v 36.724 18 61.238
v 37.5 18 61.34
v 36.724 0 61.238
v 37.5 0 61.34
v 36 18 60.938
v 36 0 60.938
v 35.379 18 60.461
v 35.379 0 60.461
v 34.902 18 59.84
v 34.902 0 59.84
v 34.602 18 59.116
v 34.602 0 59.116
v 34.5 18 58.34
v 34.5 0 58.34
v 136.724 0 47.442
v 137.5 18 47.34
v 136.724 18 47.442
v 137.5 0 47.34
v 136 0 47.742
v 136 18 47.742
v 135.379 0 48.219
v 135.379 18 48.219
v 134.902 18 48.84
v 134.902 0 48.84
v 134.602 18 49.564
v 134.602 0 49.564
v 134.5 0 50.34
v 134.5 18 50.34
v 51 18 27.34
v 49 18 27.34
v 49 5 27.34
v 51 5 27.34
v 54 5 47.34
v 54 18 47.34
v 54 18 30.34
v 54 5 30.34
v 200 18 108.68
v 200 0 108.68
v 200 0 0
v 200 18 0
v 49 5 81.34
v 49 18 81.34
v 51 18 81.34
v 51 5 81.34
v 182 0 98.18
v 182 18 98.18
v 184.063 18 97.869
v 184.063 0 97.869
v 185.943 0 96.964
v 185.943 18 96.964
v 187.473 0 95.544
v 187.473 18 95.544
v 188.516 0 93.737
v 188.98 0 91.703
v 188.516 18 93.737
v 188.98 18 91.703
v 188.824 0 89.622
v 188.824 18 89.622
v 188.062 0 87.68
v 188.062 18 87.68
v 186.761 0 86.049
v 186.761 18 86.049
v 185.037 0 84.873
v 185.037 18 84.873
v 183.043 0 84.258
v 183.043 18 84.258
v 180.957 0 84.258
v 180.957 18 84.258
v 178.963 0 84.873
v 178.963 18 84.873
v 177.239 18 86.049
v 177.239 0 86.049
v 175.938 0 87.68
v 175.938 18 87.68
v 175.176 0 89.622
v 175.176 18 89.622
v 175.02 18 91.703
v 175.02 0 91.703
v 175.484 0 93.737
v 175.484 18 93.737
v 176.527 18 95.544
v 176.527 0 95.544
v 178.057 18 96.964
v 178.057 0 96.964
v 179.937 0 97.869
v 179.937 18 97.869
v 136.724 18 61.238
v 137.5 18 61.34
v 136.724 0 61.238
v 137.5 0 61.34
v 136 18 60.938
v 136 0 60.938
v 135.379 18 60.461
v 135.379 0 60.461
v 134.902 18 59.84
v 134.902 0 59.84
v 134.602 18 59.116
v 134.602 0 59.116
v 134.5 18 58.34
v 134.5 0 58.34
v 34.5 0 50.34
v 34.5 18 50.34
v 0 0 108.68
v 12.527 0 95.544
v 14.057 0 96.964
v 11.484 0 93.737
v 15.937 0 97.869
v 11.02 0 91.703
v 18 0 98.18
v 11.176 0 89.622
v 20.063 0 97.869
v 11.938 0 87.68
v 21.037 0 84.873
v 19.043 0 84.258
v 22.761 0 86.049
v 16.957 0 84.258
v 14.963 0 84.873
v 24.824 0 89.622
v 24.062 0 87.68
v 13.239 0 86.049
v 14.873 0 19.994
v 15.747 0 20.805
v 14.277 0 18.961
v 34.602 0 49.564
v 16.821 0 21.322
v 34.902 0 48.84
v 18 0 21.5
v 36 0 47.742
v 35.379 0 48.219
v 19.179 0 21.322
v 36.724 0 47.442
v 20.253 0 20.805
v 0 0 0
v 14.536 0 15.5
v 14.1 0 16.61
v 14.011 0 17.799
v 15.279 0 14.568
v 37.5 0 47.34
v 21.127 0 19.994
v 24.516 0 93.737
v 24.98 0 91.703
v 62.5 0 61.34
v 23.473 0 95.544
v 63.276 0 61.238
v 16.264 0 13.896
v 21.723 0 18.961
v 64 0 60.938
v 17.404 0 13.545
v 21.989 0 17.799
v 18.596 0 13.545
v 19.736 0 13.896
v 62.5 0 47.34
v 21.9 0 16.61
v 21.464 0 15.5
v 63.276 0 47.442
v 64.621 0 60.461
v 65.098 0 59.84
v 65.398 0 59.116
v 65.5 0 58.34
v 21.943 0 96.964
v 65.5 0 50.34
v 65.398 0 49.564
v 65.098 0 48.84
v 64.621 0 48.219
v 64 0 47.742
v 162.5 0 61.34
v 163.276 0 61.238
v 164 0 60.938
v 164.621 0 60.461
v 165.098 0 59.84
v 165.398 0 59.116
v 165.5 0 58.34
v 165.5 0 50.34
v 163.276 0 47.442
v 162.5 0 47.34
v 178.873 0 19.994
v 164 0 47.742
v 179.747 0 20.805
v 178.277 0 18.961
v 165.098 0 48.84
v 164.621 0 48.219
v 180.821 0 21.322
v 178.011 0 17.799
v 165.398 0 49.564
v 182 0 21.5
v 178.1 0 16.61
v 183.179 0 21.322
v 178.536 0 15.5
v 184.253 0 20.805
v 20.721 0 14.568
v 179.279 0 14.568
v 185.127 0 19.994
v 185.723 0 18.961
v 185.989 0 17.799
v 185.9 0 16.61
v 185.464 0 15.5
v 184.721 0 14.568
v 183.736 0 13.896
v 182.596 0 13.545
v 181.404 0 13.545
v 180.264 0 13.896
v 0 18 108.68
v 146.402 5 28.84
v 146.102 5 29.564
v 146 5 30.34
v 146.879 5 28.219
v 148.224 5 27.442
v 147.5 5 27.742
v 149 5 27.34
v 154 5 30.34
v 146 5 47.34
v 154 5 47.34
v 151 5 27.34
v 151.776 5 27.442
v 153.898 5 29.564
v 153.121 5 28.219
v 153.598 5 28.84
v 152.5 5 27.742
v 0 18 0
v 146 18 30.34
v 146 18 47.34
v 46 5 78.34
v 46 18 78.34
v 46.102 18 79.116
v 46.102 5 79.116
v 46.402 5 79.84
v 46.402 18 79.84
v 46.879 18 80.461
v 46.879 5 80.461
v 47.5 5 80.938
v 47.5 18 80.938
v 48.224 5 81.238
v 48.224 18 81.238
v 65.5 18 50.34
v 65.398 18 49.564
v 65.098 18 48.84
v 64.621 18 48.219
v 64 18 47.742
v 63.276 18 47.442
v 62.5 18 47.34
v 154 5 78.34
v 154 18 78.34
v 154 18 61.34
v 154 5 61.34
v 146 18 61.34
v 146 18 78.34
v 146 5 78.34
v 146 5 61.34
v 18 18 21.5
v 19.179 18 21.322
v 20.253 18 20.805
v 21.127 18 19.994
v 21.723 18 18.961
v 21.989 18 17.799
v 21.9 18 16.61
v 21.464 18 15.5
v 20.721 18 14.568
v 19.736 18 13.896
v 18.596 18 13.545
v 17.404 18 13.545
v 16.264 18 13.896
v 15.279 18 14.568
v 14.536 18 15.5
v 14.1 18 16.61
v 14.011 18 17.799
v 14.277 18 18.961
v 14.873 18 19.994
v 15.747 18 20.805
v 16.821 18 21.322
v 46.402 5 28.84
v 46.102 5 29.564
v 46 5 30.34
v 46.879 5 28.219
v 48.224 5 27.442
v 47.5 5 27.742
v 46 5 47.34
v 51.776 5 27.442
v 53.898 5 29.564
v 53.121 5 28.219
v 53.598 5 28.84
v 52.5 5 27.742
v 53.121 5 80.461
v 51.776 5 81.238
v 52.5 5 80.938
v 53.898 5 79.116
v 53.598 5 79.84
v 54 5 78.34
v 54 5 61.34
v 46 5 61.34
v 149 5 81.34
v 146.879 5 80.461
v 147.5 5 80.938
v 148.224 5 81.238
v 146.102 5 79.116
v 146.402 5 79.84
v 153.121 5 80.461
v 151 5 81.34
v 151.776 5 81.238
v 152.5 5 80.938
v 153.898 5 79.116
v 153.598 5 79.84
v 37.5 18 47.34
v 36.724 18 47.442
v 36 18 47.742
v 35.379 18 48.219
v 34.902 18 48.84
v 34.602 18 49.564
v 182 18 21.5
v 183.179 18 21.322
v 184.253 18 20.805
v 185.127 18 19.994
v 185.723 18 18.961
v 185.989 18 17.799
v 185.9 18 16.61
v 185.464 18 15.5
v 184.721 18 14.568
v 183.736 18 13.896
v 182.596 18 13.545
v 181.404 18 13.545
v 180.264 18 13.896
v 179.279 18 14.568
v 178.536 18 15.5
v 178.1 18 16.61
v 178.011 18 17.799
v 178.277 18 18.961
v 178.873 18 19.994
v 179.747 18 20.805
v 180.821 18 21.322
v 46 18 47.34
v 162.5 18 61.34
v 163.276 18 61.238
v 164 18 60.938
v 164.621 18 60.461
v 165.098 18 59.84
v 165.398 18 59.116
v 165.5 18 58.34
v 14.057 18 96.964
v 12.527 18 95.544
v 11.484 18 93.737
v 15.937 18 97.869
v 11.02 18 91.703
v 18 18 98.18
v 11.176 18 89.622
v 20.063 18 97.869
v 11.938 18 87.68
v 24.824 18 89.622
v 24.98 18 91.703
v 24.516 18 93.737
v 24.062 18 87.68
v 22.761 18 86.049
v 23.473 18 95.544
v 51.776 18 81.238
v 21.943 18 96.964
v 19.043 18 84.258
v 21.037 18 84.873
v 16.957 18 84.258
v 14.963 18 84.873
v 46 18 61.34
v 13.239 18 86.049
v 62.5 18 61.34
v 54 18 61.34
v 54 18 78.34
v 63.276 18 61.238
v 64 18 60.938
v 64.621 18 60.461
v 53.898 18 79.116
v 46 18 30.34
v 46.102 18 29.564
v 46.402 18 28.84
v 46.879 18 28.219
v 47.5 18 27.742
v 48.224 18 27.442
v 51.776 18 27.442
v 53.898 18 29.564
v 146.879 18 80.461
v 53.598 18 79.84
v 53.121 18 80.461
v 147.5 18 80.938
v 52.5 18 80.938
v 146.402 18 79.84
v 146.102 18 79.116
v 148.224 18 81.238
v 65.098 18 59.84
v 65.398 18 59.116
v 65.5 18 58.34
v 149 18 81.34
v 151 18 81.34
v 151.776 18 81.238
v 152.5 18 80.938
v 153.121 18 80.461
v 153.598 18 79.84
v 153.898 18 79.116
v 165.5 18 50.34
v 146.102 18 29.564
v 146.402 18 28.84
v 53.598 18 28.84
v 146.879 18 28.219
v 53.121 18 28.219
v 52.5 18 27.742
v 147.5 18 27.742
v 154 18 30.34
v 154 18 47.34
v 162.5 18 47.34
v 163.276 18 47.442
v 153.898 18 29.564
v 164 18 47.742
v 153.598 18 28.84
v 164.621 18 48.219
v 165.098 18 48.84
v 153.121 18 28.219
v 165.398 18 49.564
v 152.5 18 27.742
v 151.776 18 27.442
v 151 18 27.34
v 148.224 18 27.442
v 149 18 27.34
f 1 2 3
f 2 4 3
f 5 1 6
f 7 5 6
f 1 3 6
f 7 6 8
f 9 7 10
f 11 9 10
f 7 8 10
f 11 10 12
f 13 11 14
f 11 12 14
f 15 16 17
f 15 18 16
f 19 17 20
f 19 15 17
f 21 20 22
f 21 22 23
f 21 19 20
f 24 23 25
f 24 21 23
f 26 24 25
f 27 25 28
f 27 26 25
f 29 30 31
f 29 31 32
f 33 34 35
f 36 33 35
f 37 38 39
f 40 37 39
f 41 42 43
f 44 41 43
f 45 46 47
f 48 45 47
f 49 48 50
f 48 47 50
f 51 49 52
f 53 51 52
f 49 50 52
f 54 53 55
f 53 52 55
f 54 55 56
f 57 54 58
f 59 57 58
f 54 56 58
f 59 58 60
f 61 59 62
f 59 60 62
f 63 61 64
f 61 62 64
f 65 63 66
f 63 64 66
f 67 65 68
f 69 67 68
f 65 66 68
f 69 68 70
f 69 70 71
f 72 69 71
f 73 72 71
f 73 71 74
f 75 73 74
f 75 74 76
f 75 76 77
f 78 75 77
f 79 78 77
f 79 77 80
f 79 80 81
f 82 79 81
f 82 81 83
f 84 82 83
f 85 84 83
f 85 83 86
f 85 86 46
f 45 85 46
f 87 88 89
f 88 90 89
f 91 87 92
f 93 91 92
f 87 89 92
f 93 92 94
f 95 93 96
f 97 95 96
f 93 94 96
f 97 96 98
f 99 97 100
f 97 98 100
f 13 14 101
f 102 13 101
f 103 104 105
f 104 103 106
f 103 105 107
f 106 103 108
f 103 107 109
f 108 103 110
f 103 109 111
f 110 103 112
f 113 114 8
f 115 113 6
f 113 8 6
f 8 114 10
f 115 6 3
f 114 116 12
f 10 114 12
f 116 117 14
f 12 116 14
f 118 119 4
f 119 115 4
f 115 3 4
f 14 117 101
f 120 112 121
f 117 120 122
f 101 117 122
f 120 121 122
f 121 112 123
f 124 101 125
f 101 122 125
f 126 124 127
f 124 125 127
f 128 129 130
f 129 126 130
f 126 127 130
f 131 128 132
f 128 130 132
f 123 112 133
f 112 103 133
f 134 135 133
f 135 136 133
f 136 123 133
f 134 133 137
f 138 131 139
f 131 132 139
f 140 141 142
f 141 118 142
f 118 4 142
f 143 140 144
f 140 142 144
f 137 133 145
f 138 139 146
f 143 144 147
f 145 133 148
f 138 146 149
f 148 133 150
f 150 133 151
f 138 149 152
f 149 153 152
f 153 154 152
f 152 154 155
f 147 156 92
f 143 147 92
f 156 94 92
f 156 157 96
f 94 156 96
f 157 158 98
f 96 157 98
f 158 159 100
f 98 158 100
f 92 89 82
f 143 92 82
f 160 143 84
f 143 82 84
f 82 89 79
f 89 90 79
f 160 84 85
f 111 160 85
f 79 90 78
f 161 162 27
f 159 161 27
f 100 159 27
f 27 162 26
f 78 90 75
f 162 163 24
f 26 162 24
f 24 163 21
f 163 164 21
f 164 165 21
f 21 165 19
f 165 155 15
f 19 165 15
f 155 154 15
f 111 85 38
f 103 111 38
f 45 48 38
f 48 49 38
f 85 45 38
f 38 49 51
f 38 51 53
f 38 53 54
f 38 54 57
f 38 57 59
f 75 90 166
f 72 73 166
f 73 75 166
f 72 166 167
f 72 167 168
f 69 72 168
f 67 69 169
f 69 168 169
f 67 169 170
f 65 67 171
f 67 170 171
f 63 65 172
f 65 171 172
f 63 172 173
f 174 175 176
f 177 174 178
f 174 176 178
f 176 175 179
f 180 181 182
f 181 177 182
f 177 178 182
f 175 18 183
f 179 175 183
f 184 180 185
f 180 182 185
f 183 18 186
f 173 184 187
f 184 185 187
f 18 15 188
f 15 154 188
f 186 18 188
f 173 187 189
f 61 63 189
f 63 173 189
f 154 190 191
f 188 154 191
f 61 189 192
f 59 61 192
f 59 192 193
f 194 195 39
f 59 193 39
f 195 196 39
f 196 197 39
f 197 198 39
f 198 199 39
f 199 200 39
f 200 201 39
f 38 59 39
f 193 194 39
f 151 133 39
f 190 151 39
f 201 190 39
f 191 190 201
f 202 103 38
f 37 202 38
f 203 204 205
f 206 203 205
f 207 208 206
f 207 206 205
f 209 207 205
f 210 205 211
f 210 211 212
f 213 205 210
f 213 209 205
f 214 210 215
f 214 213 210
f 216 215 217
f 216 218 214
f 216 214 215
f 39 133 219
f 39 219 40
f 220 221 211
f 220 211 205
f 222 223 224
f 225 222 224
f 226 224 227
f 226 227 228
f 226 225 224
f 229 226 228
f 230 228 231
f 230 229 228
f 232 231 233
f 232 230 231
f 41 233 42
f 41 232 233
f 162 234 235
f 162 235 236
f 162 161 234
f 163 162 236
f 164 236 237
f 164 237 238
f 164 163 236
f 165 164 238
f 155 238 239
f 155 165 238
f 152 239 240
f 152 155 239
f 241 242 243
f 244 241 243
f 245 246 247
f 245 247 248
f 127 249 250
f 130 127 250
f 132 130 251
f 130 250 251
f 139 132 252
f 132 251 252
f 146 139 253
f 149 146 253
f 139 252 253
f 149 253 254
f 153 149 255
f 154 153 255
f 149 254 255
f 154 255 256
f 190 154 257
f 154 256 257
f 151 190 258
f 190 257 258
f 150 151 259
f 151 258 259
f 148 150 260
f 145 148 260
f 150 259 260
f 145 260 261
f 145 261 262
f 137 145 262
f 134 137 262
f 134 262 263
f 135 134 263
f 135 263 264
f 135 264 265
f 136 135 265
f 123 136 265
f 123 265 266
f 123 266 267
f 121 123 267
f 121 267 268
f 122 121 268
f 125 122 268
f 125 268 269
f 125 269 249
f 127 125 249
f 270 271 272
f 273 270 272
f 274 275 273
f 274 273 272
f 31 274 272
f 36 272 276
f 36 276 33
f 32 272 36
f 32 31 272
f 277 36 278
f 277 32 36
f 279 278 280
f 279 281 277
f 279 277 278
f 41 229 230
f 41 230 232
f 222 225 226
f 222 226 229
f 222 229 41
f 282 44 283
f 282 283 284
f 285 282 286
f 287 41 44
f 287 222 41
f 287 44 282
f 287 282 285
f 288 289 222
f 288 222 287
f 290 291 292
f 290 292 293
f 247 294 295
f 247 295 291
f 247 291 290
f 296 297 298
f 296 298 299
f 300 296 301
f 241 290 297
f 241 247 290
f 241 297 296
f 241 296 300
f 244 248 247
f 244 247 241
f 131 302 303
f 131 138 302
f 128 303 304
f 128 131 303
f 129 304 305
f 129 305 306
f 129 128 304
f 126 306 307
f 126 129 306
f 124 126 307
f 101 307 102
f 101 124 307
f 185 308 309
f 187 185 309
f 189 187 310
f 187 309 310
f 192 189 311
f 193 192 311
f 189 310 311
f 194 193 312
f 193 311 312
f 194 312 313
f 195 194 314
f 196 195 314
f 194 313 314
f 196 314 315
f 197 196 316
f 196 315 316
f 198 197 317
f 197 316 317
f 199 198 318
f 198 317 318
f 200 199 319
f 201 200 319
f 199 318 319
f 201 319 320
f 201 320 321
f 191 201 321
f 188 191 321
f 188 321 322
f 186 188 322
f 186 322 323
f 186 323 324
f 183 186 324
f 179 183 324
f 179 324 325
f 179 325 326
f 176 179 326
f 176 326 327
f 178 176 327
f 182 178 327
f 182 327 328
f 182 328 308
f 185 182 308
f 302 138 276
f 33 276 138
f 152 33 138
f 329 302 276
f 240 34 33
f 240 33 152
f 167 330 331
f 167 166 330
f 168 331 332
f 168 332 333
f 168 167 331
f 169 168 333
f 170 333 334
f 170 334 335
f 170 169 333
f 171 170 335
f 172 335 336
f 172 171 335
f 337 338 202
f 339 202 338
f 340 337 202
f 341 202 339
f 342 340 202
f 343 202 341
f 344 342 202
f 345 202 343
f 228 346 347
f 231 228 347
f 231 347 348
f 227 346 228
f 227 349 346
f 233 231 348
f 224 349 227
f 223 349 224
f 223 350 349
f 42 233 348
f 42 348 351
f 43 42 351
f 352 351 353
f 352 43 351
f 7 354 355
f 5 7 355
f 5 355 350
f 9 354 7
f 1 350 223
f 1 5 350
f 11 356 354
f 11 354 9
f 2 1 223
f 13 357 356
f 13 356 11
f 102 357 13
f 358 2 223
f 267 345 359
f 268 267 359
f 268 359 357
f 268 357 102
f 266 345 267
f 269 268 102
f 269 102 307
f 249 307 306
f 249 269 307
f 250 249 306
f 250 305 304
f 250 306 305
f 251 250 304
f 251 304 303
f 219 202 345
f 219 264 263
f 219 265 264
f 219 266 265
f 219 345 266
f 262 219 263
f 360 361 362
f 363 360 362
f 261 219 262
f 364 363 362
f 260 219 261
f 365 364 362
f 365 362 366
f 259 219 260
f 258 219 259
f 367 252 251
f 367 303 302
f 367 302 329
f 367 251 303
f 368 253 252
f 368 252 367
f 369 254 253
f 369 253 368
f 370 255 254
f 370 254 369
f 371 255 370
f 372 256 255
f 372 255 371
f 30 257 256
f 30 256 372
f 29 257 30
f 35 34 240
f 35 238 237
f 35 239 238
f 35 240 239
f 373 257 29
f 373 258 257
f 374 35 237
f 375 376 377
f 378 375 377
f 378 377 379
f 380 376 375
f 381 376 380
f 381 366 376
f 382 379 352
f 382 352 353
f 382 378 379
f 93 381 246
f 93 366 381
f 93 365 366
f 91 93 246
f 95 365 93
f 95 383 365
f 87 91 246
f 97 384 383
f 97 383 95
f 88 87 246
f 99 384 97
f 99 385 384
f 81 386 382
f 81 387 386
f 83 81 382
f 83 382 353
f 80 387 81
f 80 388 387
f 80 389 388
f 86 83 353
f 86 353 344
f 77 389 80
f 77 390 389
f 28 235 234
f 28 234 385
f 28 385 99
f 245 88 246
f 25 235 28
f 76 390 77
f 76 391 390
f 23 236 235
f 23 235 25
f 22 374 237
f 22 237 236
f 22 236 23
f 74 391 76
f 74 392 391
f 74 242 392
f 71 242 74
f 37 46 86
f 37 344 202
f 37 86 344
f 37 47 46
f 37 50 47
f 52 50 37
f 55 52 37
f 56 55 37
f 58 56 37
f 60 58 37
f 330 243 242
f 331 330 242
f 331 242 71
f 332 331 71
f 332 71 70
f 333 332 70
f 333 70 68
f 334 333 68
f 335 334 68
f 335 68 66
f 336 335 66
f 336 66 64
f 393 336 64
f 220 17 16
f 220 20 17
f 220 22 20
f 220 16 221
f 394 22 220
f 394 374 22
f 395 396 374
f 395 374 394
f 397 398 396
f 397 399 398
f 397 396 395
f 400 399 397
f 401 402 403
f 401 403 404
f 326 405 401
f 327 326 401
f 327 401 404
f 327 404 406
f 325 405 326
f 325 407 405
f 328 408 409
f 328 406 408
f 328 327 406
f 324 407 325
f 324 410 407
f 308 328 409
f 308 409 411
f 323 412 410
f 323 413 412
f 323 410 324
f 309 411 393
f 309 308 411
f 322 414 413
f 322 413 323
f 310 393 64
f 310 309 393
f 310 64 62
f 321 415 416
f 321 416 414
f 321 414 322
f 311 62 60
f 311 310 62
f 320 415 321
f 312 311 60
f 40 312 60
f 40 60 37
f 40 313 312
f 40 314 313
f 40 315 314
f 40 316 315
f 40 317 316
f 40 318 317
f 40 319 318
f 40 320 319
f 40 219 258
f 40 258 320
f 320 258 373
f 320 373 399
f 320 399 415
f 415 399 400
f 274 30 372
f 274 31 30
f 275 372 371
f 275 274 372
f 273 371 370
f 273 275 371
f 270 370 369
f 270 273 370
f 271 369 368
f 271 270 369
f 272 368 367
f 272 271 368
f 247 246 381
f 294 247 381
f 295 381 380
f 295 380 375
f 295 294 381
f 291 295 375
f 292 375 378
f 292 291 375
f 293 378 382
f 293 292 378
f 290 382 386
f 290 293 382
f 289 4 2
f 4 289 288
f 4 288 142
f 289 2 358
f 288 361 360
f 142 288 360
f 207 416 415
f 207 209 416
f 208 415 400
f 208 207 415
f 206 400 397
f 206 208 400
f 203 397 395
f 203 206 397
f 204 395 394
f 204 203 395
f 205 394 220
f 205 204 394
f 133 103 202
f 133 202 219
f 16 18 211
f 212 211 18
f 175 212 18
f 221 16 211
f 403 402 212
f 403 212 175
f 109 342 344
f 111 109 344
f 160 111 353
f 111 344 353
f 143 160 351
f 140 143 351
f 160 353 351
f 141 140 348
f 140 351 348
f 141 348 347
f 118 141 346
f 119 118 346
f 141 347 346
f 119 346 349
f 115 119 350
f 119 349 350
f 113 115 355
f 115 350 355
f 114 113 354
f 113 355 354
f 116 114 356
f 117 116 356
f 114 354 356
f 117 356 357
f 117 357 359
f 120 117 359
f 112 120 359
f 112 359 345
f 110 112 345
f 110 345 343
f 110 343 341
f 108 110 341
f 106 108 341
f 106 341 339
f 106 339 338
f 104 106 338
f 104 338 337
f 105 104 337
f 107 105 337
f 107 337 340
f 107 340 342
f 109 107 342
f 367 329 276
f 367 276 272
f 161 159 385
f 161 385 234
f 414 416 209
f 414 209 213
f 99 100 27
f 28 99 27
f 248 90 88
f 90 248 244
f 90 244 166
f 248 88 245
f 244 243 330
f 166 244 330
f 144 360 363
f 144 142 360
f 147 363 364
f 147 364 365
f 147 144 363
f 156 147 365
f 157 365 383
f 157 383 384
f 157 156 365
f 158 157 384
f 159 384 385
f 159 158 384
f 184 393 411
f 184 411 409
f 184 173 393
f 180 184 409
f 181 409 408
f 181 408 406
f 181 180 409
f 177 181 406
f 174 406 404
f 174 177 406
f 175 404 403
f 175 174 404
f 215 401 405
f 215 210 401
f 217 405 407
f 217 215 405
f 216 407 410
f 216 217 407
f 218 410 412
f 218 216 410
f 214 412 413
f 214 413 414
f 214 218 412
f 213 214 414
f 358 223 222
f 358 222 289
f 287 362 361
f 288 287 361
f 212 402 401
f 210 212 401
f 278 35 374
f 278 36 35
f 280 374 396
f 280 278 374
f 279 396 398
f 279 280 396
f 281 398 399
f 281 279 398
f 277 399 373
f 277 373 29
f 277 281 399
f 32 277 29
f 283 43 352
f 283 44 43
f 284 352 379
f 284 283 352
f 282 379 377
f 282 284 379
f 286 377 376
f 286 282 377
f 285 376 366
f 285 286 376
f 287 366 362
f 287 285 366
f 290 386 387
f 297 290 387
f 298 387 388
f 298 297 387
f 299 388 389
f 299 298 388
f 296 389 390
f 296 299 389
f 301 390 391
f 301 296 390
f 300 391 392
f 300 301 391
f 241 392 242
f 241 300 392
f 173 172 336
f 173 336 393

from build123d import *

# Parameters (mm, degrees)
SKETCH1_W           = 200
SKETCH1_H           = 108.68
BOSS_EXTRUDE1_DEPTH = 18
SKETCH2_R           = 4
SKETCH2_R_2         = 7
SKETCH2_W           = 31
SKETCH2_H           = 14
CUT_EXTRUDE1_DEPTH  = 30
SKETCH3_W           = 8
SKETCH3_H           = 20
CUT_EXTRUDE2_DEPTH  = 13
FILLET1_R           = 3


with BuildPart() as part:
    # Sketch1 → Boss-Extrude1 (new body)
    with BuildSketch(Plane(origin=(0, 0, 0), x_dir=(1, 0, 0), z_dir=(0, 1, 0))):
        with Locations((100, -54.34)):
            Rectangle(SKETCH1_W, SKETCH1_H)
    extrude(amount=BOSS_EXTRUDE1_DEPTH)

    # Sketch2 → Cut-Extrude1 (cut)
    with BuildSketch(Plane(origin=(0, 18, 0), x_dir=(1, 0, 0), z_dir=(0, 1, 0))):
        with Locations(Location((18, -17.5, 0), (0, 0, 270))):
            Circle(SKETCH2_R)
        with Locations(Location((182, -17.5, 0), (0, 0, 270))):
            Circle(SKETCH2_R)
        with Locations(Location((18, -91.18, 0), (0, 0, 270))):
            Circle(SKETCH2_R_2)
        with Locations(Location((182, -91.18, 0), (0, 0, 270))):
            Circle(SKETCH2_R_2)
        with Locations((150, -54.34)):
            Rectangle(SKETCH2_W, SKETCH2_H)
        with Locations((50, -54.34)):
            Rectangle(SKETCH2_W, SKETCH2_H)
    extrude(amount=-CUT_EXTRUDE1_DEPTH, mode=Mode.SUBTRACT)

    # Sketch3 → Cut-Extrude2 (cut)
    with BuildSketch(Plane(origin=(0, 18, 0), x_dir=(1, 0, 0), z_dir=(0, 1, 0))):
        with Locations((50, -37.34)):
            Rectangle(SKETCH3_W, SKETCH3_H)
        with Locations((50, -71.34)):
            Rectangle(SKETCH3_W, SKETCH3_H)
        with Locations((150, -71.34)):
            Rectangle(SKETCH3_W, SKETCH3_H)
        with Locations((150, -37.34)):
            Rectangle(SKETCH3_W, SKETCH3_H)
    extrude(amount=-CUT_EXTRUDE2_DEPTH, mode=Mode.SUBTRACT)

    # Fillet1
    fillet1_edges = [part.edges().sort_by_distance(p)[0] for p in [
        (146, 11.5, 27.34),
        (154, 11.5, 27.34),
        (34.5, 9, 61.34),
        (34.5, 9, 47.34),
        (65.5, 9, 47.34),
        (65.5, 9, 61.34),
        (134.5, 9, 47.34),
        (165.5, 9, 47.34),
        (165.5, 9, 61.34),
        (134.5, 9, 61.34),
        (46, 11.5, 27.34),
        (54, 11.5, 27.34),
        (46, 11.5, 81.34),
        (54, 11.5, 81.34),
        (154, 11.5, 81.34),
        (146, 11.5, 81.34),
    ]]
    fillet(fillet1_edges, radius=FILLET1_R)


solid = part.part
